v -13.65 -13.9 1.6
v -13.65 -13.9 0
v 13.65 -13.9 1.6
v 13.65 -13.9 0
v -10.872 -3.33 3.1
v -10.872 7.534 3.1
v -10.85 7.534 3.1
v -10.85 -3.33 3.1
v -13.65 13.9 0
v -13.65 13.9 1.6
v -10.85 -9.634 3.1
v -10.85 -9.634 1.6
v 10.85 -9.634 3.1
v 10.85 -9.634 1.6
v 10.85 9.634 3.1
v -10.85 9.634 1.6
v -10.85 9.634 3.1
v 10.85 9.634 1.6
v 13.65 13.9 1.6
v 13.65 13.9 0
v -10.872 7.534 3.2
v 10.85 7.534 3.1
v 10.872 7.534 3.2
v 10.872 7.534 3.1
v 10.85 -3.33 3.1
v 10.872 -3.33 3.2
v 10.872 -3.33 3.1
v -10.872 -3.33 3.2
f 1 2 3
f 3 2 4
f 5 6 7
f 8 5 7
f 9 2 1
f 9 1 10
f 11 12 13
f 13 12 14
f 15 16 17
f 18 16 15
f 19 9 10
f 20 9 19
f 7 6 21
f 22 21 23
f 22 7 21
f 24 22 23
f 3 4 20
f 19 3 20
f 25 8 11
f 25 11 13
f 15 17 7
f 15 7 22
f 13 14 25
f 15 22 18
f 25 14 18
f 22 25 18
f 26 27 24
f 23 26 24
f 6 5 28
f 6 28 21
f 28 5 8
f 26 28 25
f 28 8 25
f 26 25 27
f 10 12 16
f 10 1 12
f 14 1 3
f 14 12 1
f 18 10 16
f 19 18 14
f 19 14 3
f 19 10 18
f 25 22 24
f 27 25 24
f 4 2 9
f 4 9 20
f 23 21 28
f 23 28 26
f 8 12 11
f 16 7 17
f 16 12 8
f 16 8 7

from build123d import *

# Parameters (mm, degrees)
SKETCH_1_W      = 27.3
SKETCH_1_H      = 27.8
EXTRUDE_1_DEPTH = 1.6
SKETCH_2_W      = 21.7
SKETCH_2_H      = 19.268
EXTRUDE_2_DEPTH = 1.5
SKETCH_3_W      = 21.744
SKETCH_3_H      = 10.864
EXTRUDE_3_DEPTH = 0.1


with BuildPart() as part:
    # 草图1 → 凸台-拉伸1 (new body)
    with BuildSketch(Plane.XY):
        Rectangle(SKETCH_1_W, SKETCH_1_H)
    extrude(amount=EXTRUDE_1_DEPTH)

    # 草图2 → 凸台-拉伸2 (add)
    with BuildSketch(Plane.XY.offset(1.6)):
        Rectangle(SKETCH_2_W, SKETCH_2_H)
    extrude(amount=EXTRUDE_2_DEPTH)

    # 草图3 → 凸台-拉伸3 (add)
    with BuildSketch(Plane.XY.offset(3.1)):
        with Locations((0, 2.102)):
            Rectangle(SKETCH_3_W, SKETCH_3_H)
    extrude(amount=EXTRUDE_3_DEPTH)


solid = part.part
